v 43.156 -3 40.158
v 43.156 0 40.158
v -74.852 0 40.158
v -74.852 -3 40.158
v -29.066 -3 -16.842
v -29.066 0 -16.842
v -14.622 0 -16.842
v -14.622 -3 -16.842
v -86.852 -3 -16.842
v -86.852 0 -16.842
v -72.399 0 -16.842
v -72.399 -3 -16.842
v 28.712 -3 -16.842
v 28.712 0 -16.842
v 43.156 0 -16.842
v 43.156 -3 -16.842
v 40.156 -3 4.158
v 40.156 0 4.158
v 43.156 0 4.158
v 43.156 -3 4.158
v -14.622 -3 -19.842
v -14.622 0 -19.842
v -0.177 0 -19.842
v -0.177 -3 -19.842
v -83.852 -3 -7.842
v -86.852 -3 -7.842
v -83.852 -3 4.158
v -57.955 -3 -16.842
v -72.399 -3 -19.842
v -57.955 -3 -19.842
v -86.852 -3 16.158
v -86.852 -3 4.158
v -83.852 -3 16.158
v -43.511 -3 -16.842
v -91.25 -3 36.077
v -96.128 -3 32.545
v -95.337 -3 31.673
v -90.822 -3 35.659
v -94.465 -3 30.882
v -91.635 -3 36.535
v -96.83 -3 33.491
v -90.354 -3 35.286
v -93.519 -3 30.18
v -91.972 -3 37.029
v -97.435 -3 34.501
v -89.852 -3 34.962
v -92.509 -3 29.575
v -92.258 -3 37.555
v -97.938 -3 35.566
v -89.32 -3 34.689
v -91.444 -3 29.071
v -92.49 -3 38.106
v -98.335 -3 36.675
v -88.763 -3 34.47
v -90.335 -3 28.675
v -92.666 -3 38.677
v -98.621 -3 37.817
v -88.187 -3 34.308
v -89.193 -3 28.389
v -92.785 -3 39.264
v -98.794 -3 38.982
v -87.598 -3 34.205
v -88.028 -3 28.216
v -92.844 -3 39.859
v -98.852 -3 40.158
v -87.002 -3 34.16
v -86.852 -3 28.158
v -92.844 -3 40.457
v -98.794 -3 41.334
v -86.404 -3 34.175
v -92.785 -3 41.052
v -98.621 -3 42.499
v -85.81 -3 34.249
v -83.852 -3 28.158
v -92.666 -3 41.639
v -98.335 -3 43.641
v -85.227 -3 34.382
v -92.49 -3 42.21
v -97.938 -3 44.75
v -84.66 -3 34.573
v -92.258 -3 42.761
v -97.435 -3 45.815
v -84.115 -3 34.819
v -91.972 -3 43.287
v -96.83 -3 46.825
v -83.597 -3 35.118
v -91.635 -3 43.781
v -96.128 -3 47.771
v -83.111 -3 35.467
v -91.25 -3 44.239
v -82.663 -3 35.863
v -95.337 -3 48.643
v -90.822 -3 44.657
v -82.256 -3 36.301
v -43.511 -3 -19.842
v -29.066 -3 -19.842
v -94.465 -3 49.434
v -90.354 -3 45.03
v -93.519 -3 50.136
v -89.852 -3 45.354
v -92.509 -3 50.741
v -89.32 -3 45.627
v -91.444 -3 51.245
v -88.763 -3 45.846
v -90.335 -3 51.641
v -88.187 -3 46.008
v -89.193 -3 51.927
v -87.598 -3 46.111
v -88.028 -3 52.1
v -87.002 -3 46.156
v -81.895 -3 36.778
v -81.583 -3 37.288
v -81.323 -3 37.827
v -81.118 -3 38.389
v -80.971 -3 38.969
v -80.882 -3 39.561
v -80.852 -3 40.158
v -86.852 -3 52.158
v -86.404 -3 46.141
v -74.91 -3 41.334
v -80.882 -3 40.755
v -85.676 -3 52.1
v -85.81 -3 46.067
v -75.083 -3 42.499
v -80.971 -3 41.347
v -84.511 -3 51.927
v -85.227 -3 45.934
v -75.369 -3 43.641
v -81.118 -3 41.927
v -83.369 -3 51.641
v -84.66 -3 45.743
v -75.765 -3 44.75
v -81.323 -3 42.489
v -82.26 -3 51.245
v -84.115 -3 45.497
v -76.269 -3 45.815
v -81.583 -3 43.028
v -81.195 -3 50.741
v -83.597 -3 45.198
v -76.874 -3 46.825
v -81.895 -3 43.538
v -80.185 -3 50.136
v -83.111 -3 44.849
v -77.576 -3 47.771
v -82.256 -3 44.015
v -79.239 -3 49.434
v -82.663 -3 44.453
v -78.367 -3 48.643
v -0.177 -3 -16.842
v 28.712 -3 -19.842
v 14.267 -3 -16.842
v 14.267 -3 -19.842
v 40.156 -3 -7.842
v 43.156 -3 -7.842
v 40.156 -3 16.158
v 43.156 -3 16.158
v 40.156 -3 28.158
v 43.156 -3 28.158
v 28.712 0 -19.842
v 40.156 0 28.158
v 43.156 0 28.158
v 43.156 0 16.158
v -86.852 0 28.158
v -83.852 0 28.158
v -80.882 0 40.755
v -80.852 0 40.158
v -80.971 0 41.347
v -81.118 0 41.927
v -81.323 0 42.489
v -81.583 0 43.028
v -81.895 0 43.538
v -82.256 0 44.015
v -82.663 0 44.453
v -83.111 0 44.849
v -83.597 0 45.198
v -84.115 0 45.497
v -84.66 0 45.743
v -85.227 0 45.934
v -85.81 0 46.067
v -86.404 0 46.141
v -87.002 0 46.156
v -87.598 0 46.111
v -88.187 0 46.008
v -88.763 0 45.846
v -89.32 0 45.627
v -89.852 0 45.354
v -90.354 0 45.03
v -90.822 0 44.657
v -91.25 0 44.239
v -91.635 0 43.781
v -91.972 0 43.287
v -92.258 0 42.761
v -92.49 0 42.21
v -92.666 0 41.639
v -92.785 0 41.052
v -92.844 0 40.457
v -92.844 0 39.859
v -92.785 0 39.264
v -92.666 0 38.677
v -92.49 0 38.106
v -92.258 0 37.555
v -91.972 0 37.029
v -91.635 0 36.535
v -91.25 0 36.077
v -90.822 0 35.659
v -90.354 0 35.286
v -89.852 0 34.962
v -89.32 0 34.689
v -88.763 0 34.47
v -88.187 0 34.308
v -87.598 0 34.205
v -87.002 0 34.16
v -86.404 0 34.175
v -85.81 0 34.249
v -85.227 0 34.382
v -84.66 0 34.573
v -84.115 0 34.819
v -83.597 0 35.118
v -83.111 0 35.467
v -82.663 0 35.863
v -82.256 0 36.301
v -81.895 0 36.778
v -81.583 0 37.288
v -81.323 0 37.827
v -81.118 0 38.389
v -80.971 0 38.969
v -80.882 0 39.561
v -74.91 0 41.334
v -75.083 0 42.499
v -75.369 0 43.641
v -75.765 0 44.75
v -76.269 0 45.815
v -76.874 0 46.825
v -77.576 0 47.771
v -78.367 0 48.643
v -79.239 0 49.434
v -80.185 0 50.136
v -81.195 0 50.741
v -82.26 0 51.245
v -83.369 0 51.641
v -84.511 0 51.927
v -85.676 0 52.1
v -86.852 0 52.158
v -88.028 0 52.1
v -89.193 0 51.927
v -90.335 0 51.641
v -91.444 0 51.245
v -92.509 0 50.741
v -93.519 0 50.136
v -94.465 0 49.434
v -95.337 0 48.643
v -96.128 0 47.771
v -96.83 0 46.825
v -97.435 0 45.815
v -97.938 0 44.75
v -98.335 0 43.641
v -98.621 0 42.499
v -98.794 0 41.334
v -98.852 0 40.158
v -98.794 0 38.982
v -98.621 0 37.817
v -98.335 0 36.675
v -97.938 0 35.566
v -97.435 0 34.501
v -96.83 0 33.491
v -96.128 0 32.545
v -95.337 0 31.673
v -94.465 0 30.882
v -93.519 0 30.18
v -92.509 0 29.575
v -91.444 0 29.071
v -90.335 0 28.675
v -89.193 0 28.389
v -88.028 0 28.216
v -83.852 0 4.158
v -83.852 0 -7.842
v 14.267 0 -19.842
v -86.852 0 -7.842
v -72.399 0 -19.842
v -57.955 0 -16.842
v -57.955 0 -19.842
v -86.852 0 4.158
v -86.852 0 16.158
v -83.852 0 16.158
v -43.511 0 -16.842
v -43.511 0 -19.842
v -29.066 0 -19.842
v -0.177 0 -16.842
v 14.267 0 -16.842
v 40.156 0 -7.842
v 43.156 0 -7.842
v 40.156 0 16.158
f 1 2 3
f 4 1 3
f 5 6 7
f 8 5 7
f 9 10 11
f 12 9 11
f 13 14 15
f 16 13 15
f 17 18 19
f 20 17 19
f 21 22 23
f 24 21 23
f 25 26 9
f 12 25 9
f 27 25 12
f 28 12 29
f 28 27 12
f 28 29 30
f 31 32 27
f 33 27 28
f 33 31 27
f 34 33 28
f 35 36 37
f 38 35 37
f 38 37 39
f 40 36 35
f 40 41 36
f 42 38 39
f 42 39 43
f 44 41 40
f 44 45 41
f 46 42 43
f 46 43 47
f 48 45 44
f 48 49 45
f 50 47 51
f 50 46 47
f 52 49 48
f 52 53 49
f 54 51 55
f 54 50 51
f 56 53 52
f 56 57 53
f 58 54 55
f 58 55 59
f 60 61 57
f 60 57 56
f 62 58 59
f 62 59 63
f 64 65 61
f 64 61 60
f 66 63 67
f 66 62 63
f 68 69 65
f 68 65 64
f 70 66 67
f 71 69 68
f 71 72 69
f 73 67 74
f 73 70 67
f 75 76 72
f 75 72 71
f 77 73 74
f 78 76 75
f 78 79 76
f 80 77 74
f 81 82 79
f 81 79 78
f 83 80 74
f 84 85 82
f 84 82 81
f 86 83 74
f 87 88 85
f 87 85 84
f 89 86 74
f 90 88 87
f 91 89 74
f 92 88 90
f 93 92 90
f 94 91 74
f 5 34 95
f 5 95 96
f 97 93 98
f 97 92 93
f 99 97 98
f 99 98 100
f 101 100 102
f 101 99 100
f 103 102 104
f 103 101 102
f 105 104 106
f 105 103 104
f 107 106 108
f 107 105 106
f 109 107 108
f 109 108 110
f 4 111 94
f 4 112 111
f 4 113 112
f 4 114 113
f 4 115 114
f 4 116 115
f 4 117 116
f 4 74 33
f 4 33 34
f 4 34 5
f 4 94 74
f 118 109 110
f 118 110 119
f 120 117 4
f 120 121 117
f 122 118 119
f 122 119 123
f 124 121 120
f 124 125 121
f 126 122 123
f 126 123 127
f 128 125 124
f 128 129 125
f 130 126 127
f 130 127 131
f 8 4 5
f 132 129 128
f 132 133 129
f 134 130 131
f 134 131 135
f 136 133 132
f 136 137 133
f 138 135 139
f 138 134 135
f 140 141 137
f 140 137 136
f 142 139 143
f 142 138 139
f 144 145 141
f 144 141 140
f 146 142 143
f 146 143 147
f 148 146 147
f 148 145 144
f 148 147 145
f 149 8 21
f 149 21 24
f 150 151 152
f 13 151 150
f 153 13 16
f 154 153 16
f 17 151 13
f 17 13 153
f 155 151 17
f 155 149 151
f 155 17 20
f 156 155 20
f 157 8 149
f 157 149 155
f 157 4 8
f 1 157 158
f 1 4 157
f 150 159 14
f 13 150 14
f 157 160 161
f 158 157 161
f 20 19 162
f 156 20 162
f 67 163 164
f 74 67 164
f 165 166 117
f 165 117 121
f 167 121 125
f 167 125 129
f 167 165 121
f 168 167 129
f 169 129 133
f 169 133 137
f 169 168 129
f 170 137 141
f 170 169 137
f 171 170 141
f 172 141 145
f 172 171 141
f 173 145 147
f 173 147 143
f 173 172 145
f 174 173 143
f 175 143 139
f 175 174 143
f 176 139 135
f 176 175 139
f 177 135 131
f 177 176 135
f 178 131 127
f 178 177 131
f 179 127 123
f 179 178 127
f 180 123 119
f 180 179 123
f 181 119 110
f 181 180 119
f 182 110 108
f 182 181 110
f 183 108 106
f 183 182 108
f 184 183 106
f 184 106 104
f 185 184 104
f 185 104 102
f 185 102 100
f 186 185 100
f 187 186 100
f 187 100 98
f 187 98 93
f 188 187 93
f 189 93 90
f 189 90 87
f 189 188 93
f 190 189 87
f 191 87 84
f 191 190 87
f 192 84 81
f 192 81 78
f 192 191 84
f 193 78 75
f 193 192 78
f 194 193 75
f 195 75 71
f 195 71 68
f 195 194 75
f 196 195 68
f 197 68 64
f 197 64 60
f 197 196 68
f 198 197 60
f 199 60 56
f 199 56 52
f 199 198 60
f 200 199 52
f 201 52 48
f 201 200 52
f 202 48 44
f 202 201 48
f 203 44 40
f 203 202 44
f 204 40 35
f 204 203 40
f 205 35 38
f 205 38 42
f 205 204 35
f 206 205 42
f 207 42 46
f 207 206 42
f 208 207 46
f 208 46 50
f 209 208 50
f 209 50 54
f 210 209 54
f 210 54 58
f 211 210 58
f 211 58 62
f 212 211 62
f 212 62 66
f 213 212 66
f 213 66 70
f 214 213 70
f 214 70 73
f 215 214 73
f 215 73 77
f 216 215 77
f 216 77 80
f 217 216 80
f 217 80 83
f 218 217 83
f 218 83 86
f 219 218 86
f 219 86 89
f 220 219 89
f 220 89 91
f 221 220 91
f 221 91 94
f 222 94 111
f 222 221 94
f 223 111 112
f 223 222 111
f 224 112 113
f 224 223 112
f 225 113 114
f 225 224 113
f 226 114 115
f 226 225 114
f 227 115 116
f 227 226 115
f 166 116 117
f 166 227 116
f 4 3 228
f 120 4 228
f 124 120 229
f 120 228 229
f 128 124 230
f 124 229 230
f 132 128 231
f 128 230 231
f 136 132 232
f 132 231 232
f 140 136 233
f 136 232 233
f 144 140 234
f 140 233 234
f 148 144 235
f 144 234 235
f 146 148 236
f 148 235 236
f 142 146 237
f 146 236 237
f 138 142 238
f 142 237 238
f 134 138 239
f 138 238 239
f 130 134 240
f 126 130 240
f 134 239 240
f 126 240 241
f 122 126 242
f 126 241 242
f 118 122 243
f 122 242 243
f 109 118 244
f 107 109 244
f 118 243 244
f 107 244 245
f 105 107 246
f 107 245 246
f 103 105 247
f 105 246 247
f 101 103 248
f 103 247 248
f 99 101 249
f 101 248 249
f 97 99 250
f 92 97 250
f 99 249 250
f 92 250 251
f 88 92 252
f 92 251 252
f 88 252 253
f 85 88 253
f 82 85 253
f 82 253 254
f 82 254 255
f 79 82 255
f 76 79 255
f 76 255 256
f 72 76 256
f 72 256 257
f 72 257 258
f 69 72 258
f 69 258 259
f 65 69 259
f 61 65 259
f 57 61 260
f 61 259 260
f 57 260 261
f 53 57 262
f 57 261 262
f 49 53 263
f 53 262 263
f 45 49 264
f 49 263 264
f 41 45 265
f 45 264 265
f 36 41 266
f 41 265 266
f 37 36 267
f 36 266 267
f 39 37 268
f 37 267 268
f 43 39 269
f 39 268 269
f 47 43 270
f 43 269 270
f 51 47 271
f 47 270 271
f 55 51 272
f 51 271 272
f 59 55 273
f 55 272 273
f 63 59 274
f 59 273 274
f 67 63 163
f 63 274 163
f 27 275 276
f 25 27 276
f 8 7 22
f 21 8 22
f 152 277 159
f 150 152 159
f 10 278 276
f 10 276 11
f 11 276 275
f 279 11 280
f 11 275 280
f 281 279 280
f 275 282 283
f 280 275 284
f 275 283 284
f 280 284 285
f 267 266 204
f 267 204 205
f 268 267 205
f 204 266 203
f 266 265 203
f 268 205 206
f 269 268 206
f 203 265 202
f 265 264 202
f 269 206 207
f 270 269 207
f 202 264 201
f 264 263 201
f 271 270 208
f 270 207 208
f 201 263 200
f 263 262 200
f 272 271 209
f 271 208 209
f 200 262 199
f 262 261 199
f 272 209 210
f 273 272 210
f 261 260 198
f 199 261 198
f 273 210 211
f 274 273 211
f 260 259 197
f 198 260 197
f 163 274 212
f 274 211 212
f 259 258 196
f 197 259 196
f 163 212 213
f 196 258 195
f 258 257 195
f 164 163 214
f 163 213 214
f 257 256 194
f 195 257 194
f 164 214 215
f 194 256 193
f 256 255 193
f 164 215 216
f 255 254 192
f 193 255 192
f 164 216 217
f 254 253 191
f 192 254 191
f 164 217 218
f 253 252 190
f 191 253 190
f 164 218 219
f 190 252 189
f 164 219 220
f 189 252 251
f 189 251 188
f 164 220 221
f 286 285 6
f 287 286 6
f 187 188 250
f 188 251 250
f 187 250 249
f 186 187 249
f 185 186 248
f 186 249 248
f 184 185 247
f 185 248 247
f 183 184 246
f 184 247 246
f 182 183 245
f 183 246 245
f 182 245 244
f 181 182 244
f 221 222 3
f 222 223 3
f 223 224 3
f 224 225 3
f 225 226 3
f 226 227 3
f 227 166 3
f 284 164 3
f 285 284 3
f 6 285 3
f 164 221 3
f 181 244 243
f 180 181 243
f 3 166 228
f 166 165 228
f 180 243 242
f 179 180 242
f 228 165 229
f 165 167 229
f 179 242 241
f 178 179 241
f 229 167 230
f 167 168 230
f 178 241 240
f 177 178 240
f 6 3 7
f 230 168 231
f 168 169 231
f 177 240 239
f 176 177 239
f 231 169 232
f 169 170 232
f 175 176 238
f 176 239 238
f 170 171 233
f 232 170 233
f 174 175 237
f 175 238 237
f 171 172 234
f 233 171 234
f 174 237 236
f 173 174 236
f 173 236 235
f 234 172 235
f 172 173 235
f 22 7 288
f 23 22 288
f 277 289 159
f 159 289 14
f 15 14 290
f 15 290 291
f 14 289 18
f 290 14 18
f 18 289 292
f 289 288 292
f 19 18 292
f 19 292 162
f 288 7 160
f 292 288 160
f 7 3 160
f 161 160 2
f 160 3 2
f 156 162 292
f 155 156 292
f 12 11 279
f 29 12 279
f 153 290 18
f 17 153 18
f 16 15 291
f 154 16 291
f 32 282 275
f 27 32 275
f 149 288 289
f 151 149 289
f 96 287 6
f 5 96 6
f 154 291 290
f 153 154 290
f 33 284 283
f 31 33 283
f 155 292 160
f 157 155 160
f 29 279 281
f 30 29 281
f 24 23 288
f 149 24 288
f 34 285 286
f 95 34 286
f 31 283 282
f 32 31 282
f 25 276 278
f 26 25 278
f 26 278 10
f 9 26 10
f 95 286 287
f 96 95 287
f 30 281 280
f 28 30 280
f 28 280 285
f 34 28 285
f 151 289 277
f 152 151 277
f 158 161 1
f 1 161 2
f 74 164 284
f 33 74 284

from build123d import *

# Parameters (mm, degrees)
F0_R     = 6
F1_DEPTH = 3


with BuildPart() as f1:
    # F0 (on Front) → F1 (new body)
    with BuildSketch(Plane.XZ):
        with BuildLine():
            Line((40.156027, 16.157978), (40.156027, 28.157978))
            Line((40.156027, 28.157978), (43.156027, 28.157978))
            Line((43.156027, 28.157978), (43.156027, 40.157978))
            Line((43.156027, 40.157978), (40.156027, 40.157978))
            Line((40.156027, 40.157978), (-74.851933, 40.157978))
            ThreePointArc((-74.851933, 40.157978), (-95.337215, 48.64326), (-86.851933, 28.157978))
            Line((-86.851933, 28.157978), (-83.851933, 28.157978))
            Line((-83.851933, 28.157978), (-83.851933, 16.157978))
            Line((-83.851933, 16.157978), (-86.851933, 16.157978))
            Line((-86.851933, 16.157978), (-86.851933, 4.157978))
            Line((-86.851933, 4.157978), (-83.851933, 4.157978))
            Line((-83.851933, 4.157978), (-83.851933, -7.842022))
            Line((-83.851933, -7.842022), (-86.851933, -7.842022))
            Line((-86.851933, -7.842022), (-86.851933, -16.842022))
            Line((-86.851933, -16.842022), (-83.851933, -16.842022))
            Line((-83.851933, -16.842022), (-72.399493, -16.842022))
            Line((-72.399493, -16.842022), (-72.399493, -19.842022))
            Line((-72.399493, -19.842022), (-57.955053, -19.842022))
            Line((-57.955053, -19.842022), (-57.955053, -16.842022))
            Line((-57.955053, -16.842022), (-43.510613, -16.842022))
            Line((-43.510613, -16.842022), (-43.510613, -19.842022))
            Line((-43.510613, -19.842022), (-29.066173, -19.842022))
            Line((-29.066173, -19.842022), (-29.066173, -16.842022))
            Line((-29.066173, -16.842022), (-14.621733, -16.842022))
            Line((-14.621733, -16.842022), (-14.621733, -19.842022))
            Line((-14.621733, -19.842022), (-0.177293, -19.842022))
            Line((-0.177293, -19.842022), (-0.177293, -16.842022))
            Line((-0.177293, -16.842022), (14.267147, -16.842022))
            Line((14.267147, -16.842022), (14.267147, -19.842022))
            Line((14.267147, -19.842022), (28.711587, -19.842022))
            Line((28.711587, -19.842022), (28.711587, -16.842022))
            Line((28.711587, -16.842022), (40.156027, -16.842022))
            Line((40.156027, -16.842022), (43.156027, -16.842022))
            Line((43.156027, -16.842022), (43.156027, -7.842022))
            Line((43.156027, -7.842022), (40.156027, -7.842022))
            Line((40.156027, -7.842022), (40.156027, 4.157978))
            Line((40.156027, 4.157978), (43.156027, 4.157978))
            Line((43.156027, 4.157978), (43.156027, 16.157978))
            Line((43.156027, 16.157978), (40.156027, 16.157978))
        make_face()
        with Locations((-86.851933, 40.157978)):
            Circle(F0_R, mode=Mode.SUBTRACT)
    extrude(amount=F1_DEPTH)


solid = f1.part
